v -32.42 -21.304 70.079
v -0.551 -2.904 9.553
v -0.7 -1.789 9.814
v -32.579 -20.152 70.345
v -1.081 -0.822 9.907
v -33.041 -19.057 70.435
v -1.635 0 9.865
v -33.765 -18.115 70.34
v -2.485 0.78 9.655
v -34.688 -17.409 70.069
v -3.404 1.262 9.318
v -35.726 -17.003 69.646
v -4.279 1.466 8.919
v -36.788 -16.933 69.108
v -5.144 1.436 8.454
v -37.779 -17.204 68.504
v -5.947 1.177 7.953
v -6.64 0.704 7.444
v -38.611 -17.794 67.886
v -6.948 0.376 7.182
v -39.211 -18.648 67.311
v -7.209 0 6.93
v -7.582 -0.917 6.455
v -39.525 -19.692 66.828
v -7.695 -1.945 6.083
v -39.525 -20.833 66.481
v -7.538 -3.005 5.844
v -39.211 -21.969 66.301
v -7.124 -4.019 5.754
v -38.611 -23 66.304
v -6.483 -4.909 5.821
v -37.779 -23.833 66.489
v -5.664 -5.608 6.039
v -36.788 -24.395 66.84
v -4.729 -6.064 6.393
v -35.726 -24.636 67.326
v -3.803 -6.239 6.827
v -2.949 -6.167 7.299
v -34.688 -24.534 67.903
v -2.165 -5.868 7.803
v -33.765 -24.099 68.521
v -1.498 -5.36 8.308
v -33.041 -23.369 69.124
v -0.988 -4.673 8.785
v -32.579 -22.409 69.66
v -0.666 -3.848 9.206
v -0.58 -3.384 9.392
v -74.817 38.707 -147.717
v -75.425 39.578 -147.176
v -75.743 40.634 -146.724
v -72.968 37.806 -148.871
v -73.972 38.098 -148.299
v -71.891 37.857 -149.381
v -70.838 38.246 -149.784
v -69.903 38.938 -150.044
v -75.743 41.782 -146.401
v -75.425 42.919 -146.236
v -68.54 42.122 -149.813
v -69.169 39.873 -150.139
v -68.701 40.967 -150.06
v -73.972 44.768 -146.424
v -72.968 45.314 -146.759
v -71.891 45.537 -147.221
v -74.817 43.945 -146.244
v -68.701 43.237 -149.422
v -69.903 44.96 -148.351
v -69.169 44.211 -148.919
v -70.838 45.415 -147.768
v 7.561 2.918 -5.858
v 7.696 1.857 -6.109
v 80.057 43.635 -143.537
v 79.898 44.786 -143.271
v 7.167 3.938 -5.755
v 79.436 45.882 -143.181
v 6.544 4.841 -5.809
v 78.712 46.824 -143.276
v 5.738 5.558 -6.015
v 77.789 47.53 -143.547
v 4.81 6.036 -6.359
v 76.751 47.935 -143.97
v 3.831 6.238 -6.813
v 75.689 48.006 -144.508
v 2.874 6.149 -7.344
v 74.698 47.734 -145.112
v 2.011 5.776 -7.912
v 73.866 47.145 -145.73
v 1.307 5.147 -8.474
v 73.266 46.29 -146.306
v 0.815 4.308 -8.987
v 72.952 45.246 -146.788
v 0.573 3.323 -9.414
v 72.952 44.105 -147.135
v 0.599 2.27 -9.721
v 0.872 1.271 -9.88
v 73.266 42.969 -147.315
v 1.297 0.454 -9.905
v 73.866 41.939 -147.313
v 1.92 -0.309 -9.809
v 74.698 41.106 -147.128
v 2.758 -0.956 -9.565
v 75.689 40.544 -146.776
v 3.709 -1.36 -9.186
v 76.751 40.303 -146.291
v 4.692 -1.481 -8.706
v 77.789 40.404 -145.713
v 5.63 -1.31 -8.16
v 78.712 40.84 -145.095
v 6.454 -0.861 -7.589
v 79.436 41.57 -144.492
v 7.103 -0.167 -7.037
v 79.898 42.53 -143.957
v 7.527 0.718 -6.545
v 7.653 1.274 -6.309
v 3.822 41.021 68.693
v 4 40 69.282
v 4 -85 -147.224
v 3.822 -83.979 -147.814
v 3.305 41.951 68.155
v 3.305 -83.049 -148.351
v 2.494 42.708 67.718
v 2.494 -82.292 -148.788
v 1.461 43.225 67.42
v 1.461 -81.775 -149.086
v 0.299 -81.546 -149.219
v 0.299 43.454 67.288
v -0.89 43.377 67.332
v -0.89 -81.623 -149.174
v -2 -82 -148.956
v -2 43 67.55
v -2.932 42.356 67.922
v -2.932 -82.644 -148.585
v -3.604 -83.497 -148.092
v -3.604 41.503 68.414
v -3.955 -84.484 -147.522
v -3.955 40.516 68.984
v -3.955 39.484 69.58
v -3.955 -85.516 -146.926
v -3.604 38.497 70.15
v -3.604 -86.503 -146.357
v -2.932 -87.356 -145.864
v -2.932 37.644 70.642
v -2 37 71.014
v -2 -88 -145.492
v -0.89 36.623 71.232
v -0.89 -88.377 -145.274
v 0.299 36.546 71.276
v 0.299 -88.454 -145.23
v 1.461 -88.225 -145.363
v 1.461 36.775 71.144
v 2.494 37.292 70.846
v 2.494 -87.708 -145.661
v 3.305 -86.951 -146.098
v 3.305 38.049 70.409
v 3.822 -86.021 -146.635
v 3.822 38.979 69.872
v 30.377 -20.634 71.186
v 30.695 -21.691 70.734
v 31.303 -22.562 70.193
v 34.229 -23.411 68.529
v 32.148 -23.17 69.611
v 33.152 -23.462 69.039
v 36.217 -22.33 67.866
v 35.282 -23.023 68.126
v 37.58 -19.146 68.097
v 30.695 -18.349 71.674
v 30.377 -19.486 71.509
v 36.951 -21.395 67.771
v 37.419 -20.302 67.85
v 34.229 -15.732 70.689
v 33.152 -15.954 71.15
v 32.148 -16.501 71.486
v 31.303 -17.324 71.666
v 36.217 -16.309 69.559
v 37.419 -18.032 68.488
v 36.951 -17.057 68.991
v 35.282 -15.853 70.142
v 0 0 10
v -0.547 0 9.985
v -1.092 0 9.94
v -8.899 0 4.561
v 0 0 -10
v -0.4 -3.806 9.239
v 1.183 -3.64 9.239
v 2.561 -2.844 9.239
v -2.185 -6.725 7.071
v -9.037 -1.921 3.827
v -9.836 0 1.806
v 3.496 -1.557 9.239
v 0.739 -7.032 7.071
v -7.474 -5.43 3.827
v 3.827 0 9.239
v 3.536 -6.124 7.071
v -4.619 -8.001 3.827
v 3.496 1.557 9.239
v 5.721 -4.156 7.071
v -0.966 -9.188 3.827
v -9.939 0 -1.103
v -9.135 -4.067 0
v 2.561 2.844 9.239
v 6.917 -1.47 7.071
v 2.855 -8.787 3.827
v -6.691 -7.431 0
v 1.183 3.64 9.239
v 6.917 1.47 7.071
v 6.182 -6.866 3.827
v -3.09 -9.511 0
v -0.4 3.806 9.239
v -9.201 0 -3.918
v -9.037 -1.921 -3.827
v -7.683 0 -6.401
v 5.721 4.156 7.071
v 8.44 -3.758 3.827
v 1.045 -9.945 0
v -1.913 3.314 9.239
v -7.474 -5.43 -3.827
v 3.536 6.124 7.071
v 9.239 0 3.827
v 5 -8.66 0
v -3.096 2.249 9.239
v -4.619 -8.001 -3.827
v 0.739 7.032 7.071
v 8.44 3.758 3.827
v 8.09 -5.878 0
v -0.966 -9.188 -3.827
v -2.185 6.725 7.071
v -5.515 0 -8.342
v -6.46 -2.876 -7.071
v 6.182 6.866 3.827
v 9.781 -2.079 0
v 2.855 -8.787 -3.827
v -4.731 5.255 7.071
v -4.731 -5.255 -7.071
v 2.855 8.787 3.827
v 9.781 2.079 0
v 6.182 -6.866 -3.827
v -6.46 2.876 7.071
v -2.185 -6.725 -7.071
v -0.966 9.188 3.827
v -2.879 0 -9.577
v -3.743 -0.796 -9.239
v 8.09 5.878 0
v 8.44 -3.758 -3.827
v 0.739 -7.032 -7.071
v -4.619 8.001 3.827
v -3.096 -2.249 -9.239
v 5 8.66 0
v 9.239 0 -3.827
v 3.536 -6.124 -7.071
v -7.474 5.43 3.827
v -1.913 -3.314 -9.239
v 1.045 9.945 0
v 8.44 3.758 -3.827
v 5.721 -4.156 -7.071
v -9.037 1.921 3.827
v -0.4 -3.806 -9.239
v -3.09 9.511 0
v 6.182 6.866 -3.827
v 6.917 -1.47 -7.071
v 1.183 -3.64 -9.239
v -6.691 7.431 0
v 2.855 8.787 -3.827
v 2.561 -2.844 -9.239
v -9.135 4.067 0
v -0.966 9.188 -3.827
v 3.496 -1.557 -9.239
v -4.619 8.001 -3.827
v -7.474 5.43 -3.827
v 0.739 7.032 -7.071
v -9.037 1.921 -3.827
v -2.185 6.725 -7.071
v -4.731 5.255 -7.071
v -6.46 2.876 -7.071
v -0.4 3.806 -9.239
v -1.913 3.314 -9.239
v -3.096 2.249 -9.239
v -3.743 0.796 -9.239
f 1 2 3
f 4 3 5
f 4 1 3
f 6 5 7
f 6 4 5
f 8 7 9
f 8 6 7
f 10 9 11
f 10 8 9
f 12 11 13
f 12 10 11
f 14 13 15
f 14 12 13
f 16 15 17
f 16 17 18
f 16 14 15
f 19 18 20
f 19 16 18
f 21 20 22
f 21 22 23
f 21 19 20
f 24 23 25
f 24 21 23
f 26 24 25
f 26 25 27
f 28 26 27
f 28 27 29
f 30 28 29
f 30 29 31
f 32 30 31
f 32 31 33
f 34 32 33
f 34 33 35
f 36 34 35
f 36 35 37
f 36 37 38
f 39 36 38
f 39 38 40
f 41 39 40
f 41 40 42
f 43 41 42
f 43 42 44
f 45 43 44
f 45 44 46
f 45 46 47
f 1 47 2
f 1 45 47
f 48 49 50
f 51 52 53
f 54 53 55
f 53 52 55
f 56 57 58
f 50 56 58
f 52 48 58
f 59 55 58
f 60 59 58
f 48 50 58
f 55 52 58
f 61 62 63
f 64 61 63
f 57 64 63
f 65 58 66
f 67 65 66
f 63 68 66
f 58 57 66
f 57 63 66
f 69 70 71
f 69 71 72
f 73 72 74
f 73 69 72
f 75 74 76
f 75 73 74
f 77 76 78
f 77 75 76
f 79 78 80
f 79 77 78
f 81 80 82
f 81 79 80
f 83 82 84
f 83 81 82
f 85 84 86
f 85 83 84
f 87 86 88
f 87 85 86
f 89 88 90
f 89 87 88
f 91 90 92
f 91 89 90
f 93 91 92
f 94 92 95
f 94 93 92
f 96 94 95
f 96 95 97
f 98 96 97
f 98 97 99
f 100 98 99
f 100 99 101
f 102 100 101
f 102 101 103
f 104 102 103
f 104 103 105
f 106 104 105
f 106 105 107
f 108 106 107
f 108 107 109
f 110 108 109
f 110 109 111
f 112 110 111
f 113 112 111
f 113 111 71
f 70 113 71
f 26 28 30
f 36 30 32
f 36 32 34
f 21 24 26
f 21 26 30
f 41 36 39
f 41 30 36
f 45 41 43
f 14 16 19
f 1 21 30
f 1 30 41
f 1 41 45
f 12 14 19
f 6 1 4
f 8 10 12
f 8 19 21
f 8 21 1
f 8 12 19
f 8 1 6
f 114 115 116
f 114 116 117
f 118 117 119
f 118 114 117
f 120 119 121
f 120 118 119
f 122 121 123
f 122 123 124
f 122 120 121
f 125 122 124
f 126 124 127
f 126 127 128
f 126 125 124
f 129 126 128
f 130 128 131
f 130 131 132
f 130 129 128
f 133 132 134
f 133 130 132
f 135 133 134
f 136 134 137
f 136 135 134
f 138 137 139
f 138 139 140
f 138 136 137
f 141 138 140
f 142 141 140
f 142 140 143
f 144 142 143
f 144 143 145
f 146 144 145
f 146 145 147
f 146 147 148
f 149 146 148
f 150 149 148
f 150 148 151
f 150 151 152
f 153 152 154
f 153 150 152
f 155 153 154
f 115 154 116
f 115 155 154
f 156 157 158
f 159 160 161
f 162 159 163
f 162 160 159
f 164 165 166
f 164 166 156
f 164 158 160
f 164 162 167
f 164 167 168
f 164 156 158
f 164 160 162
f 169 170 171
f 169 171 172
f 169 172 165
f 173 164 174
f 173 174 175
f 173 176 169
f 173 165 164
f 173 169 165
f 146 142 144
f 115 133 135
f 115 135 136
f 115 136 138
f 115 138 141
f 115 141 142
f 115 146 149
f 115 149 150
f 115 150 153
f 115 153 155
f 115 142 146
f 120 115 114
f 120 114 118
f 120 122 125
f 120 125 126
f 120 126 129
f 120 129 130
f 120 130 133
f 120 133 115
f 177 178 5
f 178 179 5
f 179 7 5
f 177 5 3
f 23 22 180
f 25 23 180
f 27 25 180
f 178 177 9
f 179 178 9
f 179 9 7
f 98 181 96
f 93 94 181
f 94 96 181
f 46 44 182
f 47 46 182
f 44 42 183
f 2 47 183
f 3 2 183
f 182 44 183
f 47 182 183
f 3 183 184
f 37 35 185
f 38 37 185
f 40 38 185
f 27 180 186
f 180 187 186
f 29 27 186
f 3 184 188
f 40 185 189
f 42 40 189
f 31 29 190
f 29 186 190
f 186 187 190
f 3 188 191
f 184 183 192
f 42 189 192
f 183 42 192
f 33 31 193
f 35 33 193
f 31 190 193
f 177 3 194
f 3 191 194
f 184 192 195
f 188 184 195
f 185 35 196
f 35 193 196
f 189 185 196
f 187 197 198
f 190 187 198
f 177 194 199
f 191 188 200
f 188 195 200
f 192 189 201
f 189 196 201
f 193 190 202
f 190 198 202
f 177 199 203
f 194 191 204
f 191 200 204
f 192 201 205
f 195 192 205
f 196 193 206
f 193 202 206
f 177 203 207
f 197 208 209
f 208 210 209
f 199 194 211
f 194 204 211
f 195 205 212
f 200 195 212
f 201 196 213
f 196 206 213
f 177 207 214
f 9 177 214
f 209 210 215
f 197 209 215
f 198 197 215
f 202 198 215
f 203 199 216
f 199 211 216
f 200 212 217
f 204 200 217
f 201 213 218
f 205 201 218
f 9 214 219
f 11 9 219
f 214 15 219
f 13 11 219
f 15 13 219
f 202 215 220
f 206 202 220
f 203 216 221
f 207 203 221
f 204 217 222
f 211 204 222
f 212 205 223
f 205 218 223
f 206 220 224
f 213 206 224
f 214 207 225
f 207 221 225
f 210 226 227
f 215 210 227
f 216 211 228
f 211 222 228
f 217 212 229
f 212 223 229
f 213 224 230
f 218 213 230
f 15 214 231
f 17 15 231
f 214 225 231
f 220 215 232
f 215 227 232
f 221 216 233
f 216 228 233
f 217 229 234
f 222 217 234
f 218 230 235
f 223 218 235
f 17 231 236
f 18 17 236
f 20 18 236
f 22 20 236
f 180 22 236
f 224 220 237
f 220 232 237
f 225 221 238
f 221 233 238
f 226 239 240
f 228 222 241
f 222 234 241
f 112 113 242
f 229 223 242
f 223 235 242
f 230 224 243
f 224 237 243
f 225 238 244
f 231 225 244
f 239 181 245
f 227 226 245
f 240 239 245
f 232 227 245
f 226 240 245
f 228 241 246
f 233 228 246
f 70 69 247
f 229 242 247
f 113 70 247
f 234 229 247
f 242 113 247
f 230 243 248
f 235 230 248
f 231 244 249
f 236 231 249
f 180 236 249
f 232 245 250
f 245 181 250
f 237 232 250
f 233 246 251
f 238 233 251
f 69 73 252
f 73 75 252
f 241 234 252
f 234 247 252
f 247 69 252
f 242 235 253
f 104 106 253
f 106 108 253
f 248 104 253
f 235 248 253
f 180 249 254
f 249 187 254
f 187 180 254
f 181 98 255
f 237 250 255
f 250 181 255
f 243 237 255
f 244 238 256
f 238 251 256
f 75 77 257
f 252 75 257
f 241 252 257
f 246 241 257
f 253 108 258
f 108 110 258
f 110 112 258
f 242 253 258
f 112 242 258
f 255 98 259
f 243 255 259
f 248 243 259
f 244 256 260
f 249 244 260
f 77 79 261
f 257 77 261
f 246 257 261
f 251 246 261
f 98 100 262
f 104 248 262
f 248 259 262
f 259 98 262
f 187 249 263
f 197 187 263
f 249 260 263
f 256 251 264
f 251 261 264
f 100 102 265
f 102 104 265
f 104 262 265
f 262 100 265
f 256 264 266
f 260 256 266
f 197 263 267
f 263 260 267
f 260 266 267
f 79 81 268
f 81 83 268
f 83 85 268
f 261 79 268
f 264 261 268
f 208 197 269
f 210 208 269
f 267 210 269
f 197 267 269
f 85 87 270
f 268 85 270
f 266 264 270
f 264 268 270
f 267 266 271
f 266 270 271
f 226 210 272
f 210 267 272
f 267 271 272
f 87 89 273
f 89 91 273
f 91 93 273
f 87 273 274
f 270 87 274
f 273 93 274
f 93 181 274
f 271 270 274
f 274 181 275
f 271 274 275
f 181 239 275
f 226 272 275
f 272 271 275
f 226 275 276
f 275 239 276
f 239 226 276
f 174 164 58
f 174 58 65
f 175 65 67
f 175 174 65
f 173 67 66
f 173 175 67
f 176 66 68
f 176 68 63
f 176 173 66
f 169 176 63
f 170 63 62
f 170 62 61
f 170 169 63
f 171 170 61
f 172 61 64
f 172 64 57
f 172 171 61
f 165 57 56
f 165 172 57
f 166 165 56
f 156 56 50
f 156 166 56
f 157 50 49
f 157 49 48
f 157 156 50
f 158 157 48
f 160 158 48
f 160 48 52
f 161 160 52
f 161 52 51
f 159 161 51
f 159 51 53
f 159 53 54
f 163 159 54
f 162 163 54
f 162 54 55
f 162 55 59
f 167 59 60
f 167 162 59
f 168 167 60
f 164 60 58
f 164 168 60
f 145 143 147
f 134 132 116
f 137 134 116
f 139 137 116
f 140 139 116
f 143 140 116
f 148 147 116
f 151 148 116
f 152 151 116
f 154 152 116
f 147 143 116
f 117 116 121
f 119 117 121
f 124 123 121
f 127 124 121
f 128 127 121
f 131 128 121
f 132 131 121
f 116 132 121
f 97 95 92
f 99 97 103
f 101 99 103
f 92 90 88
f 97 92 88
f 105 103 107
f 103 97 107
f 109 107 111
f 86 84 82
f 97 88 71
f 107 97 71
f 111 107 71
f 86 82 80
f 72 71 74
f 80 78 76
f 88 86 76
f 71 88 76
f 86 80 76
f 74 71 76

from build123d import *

# Parameters (mm, degrees)
F12_R     = 4
F14_DEPTH = 250
F11_R     = 4
F15_DEPTH = 250
F13_R     = 4
F16_DEPTH = 250


with BuildPart() as f1:
    # F0 (on Front) → F1 (revolve)
    with BuildSketch(Plane.XZ):
        with BuildLine():
            Line((0, 0), (0, 10))
            ThreePointArc((0, 10), (-10, 0), (0, -10))
            Line((0, -10), (0, 0))
        make_face()
    revolve(axis=Axis((0, 0, 5), (0, 0, 1)))

    # F12 (on line) → F14 (join)
    with BuildSketch(Plane(origin=(-35.9926120505, -20.7803442562, 68.3572173978), x_dir=(0.8930750841, -0.1308573606, 0.4304570191), z_dir=(-0.4499076506, -0.2597543032, 0.8544652175))):
        Circle(F12_R)
    extrude(amount=-F14_DEPTH)


with BuildPart() as f15:
    # F11 (on line) → F15 (new body)
    with BuildSketch(Plane(origin=(0, 40, 69.2820323028), x_dir=(1, 0, 0), z_dir=(0, 0.5, 0.8660254038))):
        Circle(F11_R)
    extrude(amount=-F15_DEPTH)


with BuildPart() as f16:
    # F13 (on line) → F16 (new body)
    with BuildSketch(Plane(origin=(33.9584064001, -19.6058950764, 69.7311660093), x_dir=(0.9054372765, 0.1148935455, -0.4086353038), z_dir=(0.42448008, -0.2450736885, 0.8716395751))):
        Circle(F13_R)
    extrude(amount=-F16_DEPTH)


solid = Compound([f1.part, f15.part, f16.part])
